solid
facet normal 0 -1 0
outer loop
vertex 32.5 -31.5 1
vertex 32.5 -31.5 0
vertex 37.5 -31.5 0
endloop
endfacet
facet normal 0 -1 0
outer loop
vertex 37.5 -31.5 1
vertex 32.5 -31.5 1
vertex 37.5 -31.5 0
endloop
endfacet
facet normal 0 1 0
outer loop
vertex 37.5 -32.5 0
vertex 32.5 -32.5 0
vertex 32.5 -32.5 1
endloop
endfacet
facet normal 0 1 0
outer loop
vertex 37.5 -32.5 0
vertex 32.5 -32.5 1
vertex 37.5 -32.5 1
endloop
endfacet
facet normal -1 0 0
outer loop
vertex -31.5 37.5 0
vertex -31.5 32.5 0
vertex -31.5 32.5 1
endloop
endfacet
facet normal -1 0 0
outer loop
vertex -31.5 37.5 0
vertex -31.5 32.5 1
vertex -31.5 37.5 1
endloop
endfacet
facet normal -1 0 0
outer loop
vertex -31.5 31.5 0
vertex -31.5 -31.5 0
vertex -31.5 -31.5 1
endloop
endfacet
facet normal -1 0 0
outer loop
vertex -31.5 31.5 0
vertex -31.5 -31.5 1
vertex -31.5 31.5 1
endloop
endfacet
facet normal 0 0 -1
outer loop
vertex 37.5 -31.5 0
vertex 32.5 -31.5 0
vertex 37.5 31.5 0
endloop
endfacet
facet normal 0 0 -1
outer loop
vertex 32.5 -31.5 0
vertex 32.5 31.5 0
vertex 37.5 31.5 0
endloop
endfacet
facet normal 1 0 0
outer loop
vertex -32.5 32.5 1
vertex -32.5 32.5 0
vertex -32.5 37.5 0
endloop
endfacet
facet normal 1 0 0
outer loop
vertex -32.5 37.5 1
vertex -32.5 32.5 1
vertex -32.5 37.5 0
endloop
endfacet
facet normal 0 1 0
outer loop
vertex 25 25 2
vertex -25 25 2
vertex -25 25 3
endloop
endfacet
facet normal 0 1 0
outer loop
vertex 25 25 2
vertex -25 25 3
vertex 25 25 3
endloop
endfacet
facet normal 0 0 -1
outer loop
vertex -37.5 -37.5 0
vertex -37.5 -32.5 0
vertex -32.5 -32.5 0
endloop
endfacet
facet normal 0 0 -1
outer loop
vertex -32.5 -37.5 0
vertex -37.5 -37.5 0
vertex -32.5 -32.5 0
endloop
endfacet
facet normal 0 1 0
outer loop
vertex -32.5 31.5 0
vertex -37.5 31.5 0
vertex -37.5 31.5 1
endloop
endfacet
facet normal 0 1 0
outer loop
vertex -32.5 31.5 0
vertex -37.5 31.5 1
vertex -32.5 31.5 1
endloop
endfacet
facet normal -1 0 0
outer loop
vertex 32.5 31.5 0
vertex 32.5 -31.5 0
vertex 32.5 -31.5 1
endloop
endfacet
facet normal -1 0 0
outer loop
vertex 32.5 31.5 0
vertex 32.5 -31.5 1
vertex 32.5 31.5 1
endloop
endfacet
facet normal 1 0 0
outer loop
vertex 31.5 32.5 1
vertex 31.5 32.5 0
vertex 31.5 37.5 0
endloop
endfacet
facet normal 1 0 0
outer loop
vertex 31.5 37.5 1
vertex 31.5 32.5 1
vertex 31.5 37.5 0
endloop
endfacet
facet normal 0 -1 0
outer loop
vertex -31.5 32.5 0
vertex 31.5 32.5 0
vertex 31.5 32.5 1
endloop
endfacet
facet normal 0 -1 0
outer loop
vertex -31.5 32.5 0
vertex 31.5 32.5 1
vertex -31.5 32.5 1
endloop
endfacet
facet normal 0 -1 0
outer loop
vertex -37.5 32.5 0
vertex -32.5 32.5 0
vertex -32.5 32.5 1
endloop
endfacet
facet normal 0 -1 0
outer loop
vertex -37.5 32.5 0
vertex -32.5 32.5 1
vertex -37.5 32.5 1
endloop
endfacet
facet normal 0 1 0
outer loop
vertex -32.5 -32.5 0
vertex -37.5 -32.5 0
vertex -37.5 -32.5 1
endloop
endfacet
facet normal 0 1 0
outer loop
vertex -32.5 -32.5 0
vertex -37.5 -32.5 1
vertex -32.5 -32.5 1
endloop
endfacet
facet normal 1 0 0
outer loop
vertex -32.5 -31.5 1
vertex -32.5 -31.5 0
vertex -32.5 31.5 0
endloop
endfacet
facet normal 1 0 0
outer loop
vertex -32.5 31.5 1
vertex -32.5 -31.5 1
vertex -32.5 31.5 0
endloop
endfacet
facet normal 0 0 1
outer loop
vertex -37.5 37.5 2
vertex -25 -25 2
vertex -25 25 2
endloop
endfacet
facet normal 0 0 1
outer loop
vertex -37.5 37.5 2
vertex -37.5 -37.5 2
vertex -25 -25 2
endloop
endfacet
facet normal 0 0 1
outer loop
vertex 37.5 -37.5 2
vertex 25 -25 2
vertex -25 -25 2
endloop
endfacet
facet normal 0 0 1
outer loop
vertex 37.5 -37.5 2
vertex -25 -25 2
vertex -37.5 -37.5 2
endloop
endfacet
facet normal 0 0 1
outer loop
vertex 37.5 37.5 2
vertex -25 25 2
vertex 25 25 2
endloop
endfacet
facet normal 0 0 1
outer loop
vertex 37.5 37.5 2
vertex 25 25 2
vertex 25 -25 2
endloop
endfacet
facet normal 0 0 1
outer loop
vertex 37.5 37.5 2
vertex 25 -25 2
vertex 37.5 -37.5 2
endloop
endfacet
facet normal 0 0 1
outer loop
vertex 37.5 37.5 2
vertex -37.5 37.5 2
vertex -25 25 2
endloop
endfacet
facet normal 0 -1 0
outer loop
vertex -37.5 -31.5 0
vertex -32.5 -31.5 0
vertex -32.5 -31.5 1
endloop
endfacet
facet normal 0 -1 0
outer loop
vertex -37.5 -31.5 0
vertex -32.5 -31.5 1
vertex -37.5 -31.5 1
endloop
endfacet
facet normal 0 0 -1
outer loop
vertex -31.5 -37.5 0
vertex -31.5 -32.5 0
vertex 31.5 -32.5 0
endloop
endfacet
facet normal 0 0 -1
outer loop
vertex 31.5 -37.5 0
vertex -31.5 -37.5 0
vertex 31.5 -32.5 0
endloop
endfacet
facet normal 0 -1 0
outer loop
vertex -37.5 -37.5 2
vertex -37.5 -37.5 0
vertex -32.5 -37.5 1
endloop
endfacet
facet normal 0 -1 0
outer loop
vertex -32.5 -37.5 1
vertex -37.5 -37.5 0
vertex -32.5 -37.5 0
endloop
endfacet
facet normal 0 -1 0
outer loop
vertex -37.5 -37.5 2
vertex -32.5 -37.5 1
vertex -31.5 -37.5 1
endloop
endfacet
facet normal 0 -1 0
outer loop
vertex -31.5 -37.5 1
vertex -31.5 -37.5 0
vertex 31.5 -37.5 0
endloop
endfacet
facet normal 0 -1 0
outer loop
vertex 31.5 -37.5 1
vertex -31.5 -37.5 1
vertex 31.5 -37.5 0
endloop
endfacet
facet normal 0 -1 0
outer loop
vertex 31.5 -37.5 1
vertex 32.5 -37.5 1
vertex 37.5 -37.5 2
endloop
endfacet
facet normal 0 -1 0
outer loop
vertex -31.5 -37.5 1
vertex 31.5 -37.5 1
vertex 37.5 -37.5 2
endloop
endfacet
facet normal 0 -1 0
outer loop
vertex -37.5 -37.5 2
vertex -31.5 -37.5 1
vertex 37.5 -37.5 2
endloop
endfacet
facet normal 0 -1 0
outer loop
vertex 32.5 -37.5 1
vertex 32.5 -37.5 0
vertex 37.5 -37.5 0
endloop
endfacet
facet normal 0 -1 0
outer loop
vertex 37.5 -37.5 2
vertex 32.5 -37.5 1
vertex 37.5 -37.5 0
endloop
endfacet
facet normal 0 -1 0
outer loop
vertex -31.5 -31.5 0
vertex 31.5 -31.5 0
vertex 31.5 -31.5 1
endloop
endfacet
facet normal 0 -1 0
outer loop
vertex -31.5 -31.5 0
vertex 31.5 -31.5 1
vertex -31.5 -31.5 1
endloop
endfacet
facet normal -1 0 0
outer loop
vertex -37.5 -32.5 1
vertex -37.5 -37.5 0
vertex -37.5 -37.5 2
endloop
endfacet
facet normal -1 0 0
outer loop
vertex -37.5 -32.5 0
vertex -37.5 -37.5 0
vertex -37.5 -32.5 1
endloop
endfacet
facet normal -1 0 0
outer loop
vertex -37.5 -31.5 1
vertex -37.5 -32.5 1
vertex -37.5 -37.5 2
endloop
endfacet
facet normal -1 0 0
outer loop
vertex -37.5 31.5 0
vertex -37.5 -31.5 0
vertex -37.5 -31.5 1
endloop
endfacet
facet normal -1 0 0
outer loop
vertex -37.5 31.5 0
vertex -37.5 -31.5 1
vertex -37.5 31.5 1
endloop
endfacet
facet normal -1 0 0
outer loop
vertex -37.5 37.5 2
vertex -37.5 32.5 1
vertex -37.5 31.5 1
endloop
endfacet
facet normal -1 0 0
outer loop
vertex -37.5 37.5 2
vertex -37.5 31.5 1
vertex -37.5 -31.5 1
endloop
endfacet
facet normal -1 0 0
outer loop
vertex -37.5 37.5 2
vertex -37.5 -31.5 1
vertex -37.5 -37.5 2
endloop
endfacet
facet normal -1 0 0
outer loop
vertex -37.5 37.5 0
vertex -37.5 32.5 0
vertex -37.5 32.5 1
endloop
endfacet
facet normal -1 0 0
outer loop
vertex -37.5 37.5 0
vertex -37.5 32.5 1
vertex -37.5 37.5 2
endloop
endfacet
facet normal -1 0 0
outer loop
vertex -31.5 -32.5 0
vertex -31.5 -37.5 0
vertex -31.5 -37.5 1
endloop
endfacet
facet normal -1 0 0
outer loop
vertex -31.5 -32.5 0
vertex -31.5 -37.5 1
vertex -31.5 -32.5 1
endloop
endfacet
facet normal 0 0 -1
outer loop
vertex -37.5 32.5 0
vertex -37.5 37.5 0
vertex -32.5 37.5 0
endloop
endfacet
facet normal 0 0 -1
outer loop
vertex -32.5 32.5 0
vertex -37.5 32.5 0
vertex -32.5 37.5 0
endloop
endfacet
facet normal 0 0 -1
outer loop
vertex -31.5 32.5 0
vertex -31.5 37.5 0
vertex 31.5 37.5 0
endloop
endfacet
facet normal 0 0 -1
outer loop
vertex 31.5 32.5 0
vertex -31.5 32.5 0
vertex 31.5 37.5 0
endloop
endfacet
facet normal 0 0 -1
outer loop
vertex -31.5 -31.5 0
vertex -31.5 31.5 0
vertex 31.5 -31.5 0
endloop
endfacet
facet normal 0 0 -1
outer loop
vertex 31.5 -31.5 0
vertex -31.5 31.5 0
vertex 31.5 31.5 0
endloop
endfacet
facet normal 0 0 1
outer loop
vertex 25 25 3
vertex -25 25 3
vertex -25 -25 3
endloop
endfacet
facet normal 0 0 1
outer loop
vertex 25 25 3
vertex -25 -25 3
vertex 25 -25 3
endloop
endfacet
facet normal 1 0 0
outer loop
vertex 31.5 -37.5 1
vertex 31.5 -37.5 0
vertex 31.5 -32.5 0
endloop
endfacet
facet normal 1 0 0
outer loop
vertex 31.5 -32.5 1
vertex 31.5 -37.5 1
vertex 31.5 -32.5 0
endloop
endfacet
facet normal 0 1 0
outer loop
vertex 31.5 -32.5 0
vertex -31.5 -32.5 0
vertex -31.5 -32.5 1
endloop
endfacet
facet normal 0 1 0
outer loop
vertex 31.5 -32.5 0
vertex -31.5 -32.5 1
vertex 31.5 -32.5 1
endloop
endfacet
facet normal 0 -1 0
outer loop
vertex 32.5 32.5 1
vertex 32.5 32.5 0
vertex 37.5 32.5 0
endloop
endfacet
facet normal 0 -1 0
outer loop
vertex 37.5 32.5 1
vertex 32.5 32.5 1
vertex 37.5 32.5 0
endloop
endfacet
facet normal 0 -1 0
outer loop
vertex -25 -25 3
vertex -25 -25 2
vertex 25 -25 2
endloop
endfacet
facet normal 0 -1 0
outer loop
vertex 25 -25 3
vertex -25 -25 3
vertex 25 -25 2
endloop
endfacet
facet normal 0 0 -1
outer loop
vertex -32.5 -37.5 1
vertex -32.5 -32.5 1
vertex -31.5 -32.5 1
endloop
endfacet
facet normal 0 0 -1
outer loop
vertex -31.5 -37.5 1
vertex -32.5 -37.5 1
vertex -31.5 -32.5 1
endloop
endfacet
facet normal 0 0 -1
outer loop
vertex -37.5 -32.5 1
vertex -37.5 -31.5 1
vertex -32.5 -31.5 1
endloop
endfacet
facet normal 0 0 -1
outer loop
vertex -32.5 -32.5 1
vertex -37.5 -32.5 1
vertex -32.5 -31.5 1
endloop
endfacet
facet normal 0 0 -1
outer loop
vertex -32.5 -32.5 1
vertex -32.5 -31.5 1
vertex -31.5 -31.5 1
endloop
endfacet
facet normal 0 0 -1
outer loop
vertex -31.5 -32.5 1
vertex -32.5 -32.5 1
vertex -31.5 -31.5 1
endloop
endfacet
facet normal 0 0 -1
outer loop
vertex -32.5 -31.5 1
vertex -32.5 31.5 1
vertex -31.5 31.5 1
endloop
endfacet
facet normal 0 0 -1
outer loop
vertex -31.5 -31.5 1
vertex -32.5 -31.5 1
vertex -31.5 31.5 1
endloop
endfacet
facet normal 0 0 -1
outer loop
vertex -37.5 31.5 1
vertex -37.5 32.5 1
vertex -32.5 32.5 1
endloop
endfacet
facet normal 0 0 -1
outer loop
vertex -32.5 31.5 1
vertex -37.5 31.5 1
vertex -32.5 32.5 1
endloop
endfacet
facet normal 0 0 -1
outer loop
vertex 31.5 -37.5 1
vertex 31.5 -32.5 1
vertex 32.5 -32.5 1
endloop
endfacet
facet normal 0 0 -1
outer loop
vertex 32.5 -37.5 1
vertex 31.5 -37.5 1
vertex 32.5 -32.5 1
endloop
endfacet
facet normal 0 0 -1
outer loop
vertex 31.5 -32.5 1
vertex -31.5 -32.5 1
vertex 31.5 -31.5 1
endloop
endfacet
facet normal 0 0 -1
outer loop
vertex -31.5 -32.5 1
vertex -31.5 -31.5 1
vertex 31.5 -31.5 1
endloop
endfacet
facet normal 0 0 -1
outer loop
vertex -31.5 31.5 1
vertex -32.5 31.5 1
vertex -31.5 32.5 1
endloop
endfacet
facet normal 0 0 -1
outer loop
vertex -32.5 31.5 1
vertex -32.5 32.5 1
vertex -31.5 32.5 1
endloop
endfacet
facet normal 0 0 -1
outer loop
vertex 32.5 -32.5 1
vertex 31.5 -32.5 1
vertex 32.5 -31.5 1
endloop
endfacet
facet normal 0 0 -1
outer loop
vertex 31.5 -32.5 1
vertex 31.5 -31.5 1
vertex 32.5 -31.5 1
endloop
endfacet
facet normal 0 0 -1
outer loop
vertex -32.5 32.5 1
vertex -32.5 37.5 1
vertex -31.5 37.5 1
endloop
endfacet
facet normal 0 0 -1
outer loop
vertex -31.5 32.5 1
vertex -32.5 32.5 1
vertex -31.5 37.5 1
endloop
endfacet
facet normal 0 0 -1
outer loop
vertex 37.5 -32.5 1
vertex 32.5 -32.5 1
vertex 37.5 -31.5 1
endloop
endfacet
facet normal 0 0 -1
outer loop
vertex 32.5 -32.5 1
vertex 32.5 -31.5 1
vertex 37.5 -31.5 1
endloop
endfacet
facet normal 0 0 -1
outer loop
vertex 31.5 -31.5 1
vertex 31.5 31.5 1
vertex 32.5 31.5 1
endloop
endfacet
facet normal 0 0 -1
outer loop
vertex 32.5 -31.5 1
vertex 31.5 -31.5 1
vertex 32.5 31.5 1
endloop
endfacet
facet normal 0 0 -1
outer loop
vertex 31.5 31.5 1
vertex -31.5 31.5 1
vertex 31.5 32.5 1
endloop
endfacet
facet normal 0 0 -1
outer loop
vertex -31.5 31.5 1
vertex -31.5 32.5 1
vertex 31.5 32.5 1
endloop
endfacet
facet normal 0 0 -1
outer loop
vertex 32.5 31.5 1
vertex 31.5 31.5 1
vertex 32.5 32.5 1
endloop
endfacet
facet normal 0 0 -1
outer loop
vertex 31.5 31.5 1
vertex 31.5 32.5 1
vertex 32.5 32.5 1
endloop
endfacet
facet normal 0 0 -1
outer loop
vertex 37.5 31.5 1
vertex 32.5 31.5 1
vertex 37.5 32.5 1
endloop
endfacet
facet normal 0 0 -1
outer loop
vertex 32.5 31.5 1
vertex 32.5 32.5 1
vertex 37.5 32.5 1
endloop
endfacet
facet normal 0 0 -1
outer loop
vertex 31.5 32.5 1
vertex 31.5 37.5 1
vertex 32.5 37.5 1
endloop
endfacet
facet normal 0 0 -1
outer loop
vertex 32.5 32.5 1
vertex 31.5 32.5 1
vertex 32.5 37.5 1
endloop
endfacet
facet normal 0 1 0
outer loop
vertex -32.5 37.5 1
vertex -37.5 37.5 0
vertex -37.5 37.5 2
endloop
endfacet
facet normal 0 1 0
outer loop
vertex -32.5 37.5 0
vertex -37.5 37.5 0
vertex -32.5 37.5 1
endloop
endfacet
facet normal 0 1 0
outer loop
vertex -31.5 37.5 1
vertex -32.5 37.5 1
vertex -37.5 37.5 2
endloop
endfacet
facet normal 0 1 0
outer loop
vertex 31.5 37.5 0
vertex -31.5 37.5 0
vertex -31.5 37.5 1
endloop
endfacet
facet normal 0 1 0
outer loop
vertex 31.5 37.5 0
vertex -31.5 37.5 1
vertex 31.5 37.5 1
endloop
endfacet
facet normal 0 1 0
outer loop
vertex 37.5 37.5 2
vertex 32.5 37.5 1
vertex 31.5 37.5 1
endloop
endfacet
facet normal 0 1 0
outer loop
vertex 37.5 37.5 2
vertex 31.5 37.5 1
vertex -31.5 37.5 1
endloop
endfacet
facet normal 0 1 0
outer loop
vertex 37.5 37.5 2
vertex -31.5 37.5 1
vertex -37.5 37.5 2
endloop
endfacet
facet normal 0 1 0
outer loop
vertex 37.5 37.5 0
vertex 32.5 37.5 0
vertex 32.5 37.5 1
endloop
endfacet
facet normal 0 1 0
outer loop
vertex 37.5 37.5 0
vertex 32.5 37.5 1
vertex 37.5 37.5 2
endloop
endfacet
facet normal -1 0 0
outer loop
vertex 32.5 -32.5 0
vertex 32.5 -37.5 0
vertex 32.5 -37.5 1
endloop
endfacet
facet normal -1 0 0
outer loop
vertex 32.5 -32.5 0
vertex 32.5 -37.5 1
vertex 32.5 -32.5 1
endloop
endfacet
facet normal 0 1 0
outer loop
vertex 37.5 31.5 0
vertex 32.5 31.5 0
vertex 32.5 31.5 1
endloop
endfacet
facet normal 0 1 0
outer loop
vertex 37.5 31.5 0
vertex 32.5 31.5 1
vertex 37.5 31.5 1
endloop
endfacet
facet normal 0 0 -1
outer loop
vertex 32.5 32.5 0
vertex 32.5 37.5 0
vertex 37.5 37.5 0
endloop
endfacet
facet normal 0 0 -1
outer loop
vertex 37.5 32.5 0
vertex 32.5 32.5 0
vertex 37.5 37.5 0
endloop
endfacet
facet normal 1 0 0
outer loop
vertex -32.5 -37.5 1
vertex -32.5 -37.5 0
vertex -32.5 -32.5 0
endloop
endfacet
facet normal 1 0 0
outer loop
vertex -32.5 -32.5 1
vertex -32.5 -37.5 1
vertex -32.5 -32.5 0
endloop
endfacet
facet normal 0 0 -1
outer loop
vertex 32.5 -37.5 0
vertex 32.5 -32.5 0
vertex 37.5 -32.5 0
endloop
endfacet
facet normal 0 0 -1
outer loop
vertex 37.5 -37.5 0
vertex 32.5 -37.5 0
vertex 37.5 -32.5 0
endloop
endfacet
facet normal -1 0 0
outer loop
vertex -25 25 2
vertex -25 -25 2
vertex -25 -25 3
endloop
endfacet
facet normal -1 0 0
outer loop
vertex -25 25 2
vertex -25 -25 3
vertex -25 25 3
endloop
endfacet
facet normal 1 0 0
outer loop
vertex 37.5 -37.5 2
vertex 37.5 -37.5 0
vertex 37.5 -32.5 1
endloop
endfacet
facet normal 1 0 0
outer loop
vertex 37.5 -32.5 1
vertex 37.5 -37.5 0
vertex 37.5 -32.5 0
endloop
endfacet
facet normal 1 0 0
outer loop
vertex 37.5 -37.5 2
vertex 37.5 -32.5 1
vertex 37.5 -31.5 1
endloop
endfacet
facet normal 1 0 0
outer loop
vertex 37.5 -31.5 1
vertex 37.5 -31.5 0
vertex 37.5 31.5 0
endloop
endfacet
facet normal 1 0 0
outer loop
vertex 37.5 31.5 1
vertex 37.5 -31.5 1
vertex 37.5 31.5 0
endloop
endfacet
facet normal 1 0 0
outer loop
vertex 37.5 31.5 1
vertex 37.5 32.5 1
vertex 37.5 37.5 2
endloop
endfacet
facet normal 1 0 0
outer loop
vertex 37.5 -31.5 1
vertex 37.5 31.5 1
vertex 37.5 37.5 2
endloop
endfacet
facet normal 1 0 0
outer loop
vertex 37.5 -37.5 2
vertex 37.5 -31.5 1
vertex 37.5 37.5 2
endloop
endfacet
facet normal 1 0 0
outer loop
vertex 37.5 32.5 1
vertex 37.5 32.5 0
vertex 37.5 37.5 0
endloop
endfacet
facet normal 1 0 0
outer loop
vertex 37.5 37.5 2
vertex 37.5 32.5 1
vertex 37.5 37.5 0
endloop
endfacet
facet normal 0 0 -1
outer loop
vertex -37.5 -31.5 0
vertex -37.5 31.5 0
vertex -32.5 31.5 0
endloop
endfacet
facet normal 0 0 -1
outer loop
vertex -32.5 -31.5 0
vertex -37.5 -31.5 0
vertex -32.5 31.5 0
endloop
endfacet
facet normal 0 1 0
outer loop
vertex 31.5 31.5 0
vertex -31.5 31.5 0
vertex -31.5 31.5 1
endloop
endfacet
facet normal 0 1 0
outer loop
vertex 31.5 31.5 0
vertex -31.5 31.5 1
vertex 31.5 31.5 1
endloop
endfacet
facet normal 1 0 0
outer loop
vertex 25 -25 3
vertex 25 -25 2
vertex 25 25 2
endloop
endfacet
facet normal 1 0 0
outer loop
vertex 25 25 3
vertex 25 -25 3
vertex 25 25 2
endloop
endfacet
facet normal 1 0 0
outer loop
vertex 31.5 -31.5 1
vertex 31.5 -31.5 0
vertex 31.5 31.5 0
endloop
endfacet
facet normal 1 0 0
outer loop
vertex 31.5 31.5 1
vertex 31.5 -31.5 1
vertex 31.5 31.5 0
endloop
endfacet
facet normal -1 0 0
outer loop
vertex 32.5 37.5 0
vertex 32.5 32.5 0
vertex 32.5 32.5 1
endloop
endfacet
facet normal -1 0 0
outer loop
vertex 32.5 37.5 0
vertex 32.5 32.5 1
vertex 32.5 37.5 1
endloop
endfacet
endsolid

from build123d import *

# Parameters (mm, degrees)
F0_W     = 75
F0_H     = 75
F0_W_2   = 50
F0_H_2   = 50
F1_DEPTH = 2
F2_DEPTH = 3
F3_W     = 1
F3_H     = 5
F3_W_2   = 5
F3_H_2   = 1
F3_W_3   = 63
F3_H_3   = 63
F4_DEPTH = 1


with BuildPart() as f1:
    # F0 (on Top) → F1 (new body)
    with BuildSketch(Plane.XY):
        Rectangle(F0_W, F0_H)
        Rectangle(F0_W_2, F0_H_2, mode=Mode.SUBTRACT)
        Rectangle(F0_W_2, F0_H_2)
    extrude(amount=F1_DEPTH)

    # F0 (on Top) → F2 (join)
    with BuildSketch(Plane.XY):
        Rectangle(F0_W_2, F0_H_2)
    extrude(amount=F2_DEPTH)

    # F3 (on face) → F4 (cut)
    with BuildSketch(Plane.XY):
        with Locations((-32, -35)):
            Rectangle(F3_W, F3_H)
        with Locations((-35, -32)):
            Rectangle(F3_W_2, F3_H_2)
        with Locations((-32, -32)):
            Rectangle(F3_W, F3_H_2)
        with Locations((0, -32)):
            Rectangle(F3_W_3, F3_H_2)
        with Locations((-32, 0)):
            Rectangle(F3_W, F3_H_3)
        with Locations((32, -32)):
            Rectangle(F3_W, F3_H_2)
        with Locations((32, -35)):
            Rectangle(F3_W, F3_H)
        with Locations((-35, 32)):
            Rectangle(F3_W_2, F3_H_2)
        with Locations((-32, 32)):
            Rectangle(F3_W, F3_H_2)
        with Locations((0, 32)):
            Rectangle(F3_W_3, F3_H_2)
        with Locations((32, 0)):
            Rectangle(F3_W, F3_H_3)
        with Locations((35, -32)):
            Rectangle(F3_W_2, F3_H_2)
        with Locations((-32, 35)):
            Rectangle(F3_W, F3_H)
        with Locations((32, 32)):
            Rectangle(F3_W, F3_H_2)
        with Locations((32, 35)):
            Rectangle(F3_W, F3_H)
        with Locations((35, 32)):
            Rectangle(F3_W_2, F3_H_2)
    extrude(amount=F4_DEPTH, mode=Mode.SUBTRACT)


solid = f1.part
